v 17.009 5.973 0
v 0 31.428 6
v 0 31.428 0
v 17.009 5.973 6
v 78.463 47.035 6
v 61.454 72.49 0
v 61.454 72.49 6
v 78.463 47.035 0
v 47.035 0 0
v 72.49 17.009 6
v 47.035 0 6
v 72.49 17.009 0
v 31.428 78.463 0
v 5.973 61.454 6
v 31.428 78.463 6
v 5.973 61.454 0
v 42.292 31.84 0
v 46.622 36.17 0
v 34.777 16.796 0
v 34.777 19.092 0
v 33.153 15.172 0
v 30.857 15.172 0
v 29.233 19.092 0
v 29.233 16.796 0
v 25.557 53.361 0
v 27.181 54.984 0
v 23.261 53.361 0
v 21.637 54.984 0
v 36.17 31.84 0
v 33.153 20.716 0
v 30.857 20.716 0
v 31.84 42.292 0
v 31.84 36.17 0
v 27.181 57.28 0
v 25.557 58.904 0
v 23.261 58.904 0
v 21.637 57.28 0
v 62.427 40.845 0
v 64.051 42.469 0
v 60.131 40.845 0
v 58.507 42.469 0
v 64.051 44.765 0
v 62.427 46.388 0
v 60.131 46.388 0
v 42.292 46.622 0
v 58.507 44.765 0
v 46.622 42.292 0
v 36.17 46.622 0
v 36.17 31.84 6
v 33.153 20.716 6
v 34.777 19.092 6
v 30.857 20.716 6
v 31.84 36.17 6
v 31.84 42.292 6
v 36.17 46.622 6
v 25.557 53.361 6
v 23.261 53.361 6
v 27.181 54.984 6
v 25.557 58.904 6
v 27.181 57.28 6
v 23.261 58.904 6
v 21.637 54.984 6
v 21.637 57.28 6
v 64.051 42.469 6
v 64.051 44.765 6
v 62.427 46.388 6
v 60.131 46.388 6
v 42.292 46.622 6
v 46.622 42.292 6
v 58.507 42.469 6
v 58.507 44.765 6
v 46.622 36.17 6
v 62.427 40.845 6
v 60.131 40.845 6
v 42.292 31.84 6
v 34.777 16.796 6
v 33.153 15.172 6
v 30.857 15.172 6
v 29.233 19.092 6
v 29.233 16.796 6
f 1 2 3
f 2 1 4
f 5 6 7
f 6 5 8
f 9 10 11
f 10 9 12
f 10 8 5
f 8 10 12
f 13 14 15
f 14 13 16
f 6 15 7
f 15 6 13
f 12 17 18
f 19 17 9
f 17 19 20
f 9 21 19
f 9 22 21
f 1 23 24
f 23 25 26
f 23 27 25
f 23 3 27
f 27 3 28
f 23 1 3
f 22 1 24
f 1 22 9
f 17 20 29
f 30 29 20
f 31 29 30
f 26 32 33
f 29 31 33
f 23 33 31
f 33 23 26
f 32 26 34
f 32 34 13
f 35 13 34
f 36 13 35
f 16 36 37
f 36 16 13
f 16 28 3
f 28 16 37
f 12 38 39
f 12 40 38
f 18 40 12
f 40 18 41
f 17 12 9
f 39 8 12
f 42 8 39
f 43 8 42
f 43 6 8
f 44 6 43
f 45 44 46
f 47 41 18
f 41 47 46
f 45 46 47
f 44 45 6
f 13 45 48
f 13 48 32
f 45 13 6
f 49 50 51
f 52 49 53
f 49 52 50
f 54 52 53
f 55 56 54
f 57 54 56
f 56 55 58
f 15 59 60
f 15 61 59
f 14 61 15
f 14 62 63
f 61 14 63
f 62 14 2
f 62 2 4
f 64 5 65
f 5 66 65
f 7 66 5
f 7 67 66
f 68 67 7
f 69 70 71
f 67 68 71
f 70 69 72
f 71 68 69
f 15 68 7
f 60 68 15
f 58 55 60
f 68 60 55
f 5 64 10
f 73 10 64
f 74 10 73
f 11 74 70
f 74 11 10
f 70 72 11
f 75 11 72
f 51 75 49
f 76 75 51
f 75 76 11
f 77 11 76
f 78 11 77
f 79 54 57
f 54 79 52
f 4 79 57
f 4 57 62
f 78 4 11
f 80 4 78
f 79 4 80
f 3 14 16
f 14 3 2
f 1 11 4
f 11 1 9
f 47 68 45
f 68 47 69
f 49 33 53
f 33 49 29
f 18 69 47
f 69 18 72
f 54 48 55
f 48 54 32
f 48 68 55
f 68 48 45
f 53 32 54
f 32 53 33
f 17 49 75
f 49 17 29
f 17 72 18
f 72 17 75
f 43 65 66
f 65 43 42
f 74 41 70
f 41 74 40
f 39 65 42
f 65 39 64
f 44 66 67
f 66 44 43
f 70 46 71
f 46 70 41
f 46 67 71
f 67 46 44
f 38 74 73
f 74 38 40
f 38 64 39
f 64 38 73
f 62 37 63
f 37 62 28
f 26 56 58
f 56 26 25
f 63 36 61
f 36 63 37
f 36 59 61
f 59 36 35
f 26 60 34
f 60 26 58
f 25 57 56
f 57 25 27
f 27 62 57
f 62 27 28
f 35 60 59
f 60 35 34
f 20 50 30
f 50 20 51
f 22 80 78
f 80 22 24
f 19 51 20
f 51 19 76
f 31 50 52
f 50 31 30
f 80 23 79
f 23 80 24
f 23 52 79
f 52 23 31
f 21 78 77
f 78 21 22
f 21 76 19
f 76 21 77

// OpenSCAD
$fn = 32;

// ----------------------------------------------------------------------
// Polygon plate: 8-gon R40, 3 bolt windows
// ----------------------------------------------------------------------

// --- parameters (mm) ---
sides = 8;                // number of polygon sides
plate_r = 40;             // circumscribed radius of the polygon
bore_r = 8;               // centre bore radius
bolts = 3;                // number of bolt windows
ring_r = 22.48;           // bolt-circle radius
bolt_r = 3;               // bolt window radius
plate_t = 6;              // plate thickness, Z (extrusion height)
fit_tol = 0.1;            // declared fit tolerance (prompt contract)
free_tol = 0.3;           // declared free tolerance (prompt contract)

plate_d = 2 * plate_r;  // circumscribed diameter
bore_d = 2 * bore_r;  // centre bore diameter
bolt_d = 2 * bolt_r;  // bolt window diameter
ring_d = 2 * ring_r;  // bolt-circle diameter

profile = [[78.463, 47.035], [61.454, 72.49], [31.428, 78.463], [5.973, 61.454], [0, 31.428], [17.009, 5.973], [47.035, 0], [72.49, 17.009]];  // primary outline, 8 points, counter clockwise
void_1 = [[46.622, 42.292], [42.292, 46.622], [36.17, 46.622], [31.84, 42.292], [31.84, 36.17], [36.17, 31.84], [42.292, 31.84], [46.622, 36.17]];  // centre bore, 8 points
void_2 = [[64.051, 44.765], [62.427, 46.388], [60.131, 46.388], [58.507, 44.765], [58.507, 42.469], [60.131, 40.845], [62.427, 40.845], [64.051, 42.469]];  // bolt window 1, 8 points
void_3 = [[27.181, 57.28], [25.557, 58.904], [23.261, 58.904], [21.637, 57.28], [21.637, 54.984], [23.261, 53.361], [25.557, 53.361], [27.181, 54.984]];  // bolt window 2, 8 points
void_4 = [[34.777, 19.092], [33.153, 20.716], [30.857, 20.716], [29.233, 19.092], [29.233, 16.796], [30.857, 15.172], [33.153, 15.172], [34.777, 16.796]];  // bolt window 3, 8 points

// --- the one profile operation ---
difference() {
  linear_extrude(height = plate_t) polygon(points = profile);
  translate([0, 0, -1])
    linear_extrude(height = plate_t + 2) polygon(points = void_1);
  translate([0, 0, -1])
    linear_extrude(height = plate_t + 2) polygon(points = void_2);
  translate([0, 0, -1])
    linear_extrude(height = plate_t + 2) polygon(points = void_3);
  translate([0, 0, -1])
    linear_extrude(height = plate_t + 2) polygon(points = void_4);
}
